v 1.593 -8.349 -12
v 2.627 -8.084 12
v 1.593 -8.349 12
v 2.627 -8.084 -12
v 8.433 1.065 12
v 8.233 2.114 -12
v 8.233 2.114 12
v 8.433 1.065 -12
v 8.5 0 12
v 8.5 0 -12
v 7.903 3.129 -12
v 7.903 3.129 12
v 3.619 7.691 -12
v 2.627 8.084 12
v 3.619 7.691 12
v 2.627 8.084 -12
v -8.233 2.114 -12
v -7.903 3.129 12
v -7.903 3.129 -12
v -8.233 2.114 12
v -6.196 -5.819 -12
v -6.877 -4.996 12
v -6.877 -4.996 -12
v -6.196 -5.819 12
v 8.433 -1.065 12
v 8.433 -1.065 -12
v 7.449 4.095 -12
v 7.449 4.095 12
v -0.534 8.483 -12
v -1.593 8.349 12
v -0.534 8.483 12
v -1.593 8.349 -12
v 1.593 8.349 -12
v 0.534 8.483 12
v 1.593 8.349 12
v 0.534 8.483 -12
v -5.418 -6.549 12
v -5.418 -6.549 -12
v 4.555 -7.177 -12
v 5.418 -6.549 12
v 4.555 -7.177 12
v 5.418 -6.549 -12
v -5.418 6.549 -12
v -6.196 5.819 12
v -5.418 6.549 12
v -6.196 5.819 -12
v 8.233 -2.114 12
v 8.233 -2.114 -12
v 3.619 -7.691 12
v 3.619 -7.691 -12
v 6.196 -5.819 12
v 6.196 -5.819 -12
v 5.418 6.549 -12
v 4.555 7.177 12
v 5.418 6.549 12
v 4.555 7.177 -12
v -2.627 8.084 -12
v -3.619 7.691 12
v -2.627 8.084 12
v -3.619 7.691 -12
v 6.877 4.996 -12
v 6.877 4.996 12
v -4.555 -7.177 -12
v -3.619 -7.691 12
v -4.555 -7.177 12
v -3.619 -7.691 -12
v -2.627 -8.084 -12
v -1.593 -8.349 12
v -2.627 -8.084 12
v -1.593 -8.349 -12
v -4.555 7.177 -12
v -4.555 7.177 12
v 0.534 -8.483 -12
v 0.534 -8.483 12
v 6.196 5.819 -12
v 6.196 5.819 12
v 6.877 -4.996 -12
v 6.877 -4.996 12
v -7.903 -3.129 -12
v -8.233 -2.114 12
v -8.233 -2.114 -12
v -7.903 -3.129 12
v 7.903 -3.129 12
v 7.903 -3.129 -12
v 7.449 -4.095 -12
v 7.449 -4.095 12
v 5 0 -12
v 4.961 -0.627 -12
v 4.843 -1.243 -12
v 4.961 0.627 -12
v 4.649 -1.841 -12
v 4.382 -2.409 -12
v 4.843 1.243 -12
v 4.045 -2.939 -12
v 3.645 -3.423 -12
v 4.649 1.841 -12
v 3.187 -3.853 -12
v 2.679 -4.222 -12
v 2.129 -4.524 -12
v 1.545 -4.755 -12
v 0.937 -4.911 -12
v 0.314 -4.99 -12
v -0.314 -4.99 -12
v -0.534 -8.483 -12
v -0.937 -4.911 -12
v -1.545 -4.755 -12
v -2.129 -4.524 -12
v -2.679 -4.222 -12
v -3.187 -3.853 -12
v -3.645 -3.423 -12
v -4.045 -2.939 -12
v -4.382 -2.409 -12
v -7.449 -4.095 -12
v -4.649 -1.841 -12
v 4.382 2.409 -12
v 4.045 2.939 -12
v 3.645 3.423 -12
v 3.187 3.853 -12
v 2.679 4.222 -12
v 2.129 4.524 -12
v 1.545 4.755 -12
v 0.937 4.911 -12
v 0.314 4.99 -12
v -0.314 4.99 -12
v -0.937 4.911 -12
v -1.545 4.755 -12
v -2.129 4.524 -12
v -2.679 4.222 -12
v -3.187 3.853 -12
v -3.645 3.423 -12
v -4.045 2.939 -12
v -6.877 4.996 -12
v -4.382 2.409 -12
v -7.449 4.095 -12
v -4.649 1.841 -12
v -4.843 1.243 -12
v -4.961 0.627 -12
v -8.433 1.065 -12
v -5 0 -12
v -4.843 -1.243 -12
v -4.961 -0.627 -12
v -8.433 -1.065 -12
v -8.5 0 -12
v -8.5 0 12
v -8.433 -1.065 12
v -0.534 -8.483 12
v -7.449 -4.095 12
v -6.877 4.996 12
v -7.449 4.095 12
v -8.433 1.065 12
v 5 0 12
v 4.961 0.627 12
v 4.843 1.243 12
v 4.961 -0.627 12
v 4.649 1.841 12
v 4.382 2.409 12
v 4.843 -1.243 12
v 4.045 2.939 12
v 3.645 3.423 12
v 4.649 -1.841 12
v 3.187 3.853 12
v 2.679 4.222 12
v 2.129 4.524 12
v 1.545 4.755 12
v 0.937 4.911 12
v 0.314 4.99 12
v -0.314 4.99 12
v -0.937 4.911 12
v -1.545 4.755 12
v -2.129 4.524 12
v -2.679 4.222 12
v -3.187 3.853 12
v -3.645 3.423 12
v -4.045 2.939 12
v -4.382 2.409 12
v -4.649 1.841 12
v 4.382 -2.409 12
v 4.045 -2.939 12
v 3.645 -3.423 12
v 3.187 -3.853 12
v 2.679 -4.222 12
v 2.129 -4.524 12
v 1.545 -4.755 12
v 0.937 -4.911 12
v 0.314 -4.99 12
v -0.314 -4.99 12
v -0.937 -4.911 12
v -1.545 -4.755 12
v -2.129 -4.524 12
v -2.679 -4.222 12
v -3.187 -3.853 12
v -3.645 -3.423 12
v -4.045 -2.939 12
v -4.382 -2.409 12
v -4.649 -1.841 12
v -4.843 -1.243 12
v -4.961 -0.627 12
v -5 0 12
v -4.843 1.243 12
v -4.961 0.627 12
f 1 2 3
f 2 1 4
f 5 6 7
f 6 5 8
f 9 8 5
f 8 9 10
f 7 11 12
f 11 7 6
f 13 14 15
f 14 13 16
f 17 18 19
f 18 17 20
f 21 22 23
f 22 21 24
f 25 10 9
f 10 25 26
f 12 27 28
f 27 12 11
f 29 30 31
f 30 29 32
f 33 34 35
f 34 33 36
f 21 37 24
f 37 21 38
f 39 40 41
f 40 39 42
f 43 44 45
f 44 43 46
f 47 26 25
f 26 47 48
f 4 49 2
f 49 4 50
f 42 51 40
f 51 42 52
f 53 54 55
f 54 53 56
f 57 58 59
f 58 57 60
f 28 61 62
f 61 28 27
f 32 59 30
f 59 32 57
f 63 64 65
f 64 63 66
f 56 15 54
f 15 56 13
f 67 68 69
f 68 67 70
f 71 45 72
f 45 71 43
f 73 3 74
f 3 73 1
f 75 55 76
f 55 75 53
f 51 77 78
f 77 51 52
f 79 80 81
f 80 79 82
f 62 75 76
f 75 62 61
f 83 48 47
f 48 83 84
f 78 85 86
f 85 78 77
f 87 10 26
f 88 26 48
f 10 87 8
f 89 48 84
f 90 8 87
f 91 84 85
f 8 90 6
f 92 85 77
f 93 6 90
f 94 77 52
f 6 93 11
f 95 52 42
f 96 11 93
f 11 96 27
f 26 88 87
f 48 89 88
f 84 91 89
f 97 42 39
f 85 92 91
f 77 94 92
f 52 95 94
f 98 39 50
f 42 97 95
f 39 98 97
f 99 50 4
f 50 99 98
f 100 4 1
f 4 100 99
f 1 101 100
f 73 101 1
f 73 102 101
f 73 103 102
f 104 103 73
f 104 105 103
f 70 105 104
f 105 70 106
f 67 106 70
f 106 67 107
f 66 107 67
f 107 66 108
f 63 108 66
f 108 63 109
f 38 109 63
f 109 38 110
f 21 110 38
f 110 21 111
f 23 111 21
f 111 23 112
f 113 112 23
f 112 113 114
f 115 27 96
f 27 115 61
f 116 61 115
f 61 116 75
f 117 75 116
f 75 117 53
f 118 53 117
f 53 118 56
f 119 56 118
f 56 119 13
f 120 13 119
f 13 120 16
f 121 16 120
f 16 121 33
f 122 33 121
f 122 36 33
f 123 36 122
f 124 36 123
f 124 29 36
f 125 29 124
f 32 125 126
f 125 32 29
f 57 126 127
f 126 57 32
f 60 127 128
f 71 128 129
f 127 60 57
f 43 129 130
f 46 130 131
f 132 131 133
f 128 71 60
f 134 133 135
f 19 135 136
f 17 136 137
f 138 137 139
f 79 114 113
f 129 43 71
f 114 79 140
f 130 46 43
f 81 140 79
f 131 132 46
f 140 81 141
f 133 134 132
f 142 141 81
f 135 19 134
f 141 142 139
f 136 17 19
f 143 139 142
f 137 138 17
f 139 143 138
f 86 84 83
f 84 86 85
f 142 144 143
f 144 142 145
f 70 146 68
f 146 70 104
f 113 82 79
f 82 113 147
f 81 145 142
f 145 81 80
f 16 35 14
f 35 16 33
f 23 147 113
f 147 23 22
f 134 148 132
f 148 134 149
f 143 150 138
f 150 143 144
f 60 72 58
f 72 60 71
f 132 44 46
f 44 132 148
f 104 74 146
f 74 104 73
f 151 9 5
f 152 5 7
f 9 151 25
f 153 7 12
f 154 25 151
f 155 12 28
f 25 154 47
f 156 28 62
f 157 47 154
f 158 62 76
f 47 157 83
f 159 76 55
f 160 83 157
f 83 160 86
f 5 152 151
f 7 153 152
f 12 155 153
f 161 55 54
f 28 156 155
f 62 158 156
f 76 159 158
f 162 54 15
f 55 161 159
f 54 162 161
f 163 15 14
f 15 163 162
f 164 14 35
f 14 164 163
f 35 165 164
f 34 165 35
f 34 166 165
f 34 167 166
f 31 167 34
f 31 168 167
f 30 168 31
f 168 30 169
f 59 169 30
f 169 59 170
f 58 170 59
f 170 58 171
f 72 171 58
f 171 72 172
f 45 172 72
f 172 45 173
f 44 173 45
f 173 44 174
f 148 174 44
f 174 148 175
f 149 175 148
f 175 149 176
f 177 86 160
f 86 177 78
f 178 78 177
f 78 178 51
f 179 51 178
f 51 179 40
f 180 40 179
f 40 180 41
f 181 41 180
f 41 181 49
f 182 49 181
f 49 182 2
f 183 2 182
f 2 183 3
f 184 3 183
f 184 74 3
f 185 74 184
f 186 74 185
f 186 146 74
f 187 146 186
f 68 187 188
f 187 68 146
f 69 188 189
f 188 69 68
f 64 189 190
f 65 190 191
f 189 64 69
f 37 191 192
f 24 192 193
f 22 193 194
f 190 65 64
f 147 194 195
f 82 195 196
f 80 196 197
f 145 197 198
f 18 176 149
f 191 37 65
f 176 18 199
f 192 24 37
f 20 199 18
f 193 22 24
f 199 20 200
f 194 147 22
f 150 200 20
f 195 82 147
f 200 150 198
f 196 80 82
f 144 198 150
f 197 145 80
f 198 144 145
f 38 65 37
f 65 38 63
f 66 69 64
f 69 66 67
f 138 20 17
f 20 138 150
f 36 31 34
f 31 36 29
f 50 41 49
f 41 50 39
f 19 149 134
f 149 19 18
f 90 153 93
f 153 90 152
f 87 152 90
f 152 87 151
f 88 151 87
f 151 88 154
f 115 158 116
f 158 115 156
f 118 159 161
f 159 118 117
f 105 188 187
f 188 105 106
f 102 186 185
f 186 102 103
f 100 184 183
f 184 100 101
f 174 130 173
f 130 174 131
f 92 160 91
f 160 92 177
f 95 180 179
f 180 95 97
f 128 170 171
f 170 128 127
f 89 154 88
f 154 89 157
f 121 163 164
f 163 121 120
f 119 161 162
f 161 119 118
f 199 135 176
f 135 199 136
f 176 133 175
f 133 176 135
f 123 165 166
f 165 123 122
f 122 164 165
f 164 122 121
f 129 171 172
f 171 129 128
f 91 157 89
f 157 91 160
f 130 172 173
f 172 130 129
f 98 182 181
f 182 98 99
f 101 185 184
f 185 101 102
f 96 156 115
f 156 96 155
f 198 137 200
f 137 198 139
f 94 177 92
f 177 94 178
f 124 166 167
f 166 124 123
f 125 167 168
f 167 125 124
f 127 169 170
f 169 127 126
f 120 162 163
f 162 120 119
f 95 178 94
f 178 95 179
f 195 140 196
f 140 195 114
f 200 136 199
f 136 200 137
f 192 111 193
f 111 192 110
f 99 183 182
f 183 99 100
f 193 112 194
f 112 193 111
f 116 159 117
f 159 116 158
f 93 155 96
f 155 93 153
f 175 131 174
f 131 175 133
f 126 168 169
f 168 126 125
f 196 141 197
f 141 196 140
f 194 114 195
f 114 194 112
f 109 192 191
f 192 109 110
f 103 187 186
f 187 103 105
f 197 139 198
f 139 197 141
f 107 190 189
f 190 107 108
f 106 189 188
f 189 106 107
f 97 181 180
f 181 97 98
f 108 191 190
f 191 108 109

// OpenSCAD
$fn = 50;


difference() {
	union() {
		translate(v = [0, 0, -12.0000000000]) {
			cylinder(h = 24, r = 8.5000000000);
		}
	}
	union() {
		translate(v = [0, 0, -100.0000000000]) {
			cylinder(h = 200, r = 5.0000000000);
		}
	}
}
